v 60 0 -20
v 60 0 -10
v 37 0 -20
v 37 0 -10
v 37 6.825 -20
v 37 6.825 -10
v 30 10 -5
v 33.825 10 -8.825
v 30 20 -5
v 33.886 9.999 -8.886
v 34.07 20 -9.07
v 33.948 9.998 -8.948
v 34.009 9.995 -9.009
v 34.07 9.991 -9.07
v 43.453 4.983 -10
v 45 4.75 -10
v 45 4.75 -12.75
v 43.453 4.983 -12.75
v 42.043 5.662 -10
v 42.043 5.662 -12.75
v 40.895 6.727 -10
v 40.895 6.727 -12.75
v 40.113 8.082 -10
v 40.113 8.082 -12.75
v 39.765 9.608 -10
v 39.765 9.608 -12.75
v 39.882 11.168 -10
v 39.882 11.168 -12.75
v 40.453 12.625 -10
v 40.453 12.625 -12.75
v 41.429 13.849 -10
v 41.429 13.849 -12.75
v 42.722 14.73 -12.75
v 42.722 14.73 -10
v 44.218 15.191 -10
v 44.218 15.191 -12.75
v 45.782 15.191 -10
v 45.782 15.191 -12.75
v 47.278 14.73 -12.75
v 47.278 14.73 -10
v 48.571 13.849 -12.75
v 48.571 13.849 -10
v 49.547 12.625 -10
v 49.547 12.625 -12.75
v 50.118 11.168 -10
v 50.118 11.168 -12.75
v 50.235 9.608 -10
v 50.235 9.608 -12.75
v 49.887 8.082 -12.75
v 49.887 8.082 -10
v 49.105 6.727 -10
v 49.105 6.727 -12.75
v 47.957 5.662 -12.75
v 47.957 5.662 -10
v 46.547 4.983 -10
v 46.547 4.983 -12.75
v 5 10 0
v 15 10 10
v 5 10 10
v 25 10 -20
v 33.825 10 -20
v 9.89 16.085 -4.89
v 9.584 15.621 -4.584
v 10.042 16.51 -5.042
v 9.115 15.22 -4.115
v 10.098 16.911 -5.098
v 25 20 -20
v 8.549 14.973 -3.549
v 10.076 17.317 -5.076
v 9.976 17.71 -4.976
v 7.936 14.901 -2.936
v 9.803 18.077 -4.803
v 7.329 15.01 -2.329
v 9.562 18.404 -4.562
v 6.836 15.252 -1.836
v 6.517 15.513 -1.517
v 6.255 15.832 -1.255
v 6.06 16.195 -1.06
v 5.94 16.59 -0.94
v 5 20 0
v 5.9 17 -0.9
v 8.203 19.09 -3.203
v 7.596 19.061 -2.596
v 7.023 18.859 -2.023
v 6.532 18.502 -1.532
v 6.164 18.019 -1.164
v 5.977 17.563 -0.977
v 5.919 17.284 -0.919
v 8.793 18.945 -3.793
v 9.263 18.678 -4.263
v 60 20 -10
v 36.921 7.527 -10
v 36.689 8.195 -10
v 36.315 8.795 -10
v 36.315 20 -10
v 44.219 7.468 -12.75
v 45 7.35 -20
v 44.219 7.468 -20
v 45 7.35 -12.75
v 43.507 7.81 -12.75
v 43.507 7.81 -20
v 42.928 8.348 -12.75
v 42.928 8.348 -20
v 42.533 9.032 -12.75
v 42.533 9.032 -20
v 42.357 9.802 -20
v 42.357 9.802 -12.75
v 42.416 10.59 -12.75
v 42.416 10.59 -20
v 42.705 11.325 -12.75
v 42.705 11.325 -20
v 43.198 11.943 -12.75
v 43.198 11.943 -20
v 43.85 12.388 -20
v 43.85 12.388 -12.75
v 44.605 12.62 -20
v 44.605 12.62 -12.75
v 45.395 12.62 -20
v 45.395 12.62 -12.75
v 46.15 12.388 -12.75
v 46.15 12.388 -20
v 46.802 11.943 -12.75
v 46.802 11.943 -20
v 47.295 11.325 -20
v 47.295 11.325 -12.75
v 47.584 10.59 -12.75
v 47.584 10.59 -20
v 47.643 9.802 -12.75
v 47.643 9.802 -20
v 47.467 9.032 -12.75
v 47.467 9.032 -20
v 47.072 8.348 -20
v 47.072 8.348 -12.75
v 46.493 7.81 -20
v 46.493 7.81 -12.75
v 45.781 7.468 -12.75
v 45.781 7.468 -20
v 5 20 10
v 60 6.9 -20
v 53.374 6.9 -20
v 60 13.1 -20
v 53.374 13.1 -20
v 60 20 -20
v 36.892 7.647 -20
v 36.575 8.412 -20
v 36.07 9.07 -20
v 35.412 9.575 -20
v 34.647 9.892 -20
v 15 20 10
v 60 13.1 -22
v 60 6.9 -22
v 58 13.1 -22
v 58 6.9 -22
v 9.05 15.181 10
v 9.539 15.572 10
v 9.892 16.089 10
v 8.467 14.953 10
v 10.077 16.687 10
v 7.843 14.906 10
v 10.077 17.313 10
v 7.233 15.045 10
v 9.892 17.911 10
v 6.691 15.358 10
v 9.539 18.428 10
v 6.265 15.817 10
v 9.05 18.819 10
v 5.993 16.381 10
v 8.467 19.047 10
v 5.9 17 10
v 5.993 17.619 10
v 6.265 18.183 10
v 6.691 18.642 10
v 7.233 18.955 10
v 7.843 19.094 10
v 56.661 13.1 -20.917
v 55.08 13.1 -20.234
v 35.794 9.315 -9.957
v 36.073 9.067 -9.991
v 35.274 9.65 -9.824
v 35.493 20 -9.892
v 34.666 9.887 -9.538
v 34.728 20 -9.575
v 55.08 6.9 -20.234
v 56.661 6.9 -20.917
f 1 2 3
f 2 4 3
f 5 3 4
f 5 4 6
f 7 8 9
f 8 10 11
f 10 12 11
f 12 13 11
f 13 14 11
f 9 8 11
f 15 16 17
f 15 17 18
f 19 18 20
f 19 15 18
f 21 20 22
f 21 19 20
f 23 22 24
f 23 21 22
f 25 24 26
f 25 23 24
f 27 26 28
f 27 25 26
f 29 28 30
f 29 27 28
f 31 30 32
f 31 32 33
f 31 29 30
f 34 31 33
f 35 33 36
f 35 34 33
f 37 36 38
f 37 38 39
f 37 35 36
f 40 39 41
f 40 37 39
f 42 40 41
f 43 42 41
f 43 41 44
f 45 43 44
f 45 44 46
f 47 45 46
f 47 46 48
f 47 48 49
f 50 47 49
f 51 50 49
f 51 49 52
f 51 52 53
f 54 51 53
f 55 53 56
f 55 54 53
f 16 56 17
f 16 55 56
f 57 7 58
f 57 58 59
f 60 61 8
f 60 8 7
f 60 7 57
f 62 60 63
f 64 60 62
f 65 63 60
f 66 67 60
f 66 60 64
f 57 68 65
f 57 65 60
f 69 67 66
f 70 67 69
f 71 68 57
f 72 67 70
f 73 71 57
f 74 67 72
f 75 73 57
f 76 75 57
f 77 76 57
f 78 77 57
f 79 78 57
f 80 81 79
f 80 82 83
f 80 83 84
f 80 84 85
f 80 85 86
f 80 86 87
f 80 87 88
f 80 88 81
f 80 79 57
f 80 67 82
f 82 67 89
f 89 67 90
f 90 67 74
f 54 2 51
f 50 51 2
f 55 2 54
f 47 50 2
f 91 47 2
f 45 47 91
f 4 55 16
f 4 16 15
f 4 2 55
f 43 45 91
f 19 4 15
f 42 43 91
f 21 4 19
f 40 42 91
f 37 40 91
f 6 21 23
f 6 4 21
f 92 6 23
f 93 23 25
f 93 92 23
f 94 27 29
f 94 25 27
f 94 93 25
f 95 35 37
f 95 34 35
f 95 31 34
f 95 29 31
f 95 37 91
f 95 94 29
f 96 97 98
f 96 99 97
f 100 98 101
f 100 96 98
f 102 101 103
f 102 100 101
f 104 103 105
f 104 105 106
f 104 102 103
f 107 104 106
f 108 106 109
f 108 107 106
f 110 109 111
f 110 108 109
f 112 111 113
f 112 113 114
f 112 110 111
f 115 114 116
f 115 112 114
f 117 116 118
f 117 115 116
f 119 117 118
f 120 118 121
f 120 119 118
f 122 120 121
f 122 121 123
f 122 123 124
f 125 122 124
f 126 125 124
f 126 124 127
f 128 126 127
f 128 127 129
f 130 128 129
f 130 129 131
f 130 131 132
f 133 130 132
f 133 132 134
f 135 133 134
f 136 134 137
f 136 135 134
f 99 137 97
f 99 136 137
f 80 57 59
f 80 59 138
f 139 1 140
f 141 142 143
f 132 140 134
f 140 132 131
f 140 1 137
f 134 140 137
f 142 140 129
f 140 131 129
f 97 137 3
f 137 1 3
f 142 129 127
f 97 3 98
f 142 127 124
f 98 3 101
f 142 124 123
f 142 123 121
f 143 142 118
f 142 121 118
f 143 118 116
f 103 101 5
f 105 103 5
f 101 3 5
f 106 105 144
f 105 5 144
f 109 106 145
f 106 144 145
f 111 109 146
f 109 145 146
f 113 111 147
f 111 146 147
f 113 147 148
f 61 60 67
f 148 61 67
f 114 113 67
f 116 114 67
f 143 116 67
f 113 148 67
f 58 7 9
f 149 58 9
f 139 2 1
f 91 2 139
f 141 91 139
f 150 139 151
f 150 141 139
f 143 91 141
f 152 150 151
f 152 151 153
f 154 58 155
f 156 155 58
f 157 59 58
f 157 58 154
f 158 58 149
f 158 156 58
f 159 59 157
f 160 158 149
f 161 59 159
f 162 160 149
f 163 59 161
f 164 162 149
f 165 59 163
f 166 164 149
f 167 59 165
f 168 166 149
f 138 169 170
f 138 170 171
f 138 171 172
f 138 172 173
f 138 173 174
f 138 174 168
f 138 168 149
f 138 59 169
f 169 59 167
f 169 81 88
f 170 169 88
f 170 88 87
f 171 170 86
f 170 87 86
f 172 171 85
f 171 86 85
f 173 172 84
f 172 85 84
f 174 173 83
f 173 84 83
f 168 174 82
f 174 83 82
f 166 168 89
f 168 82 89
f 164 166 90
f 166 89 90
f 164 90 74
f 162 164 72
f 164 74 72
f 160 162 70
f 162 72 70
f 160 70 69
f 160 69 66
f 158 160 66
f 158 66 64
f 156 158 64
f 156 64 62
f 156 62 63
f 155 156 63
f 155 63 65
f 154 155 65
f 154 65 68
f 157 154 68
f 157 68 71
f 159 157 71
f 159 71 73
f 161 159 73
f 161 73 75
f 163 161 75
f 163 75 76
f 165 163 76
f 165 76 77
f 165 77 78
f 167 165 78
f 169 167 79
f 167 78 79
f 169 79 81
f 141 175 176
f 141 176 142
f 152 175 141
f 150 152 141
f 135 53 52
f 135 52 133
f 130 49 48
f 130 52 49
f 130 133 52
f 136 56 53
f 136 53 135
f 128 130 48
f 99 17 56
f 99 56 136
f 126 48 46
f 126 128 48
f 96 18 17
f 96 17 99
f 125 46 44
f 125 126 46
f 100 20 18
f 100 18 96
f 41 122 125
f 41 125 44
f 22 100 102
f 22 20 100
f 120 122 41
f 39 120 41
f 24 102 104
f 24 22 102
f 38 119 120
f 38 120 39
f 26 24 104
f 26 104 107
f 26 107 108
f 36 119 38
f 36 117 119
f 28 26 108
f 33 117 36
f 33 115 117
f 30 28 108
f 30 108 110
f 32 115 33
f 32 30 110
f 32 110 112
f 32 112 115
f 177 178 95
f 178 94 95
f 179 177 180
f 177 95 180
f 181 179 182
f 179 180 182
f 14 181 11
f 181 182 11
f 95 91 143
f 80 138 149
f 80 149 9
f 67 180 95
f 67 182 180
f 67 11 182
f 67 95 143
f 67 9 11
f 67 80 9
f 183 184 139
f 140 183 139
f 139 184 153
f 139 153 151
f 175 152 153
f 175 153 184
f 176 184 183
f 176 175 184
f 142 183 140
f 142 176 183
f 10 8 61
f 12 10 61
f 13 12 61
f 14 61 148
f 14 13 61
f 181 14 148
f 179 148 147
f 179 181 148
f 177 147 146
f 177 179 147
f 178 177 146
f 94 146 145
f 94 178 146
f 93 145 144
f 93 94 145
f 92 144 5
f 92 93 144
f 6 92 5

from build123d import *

# Parameters (mm, degrees)
SKETCH1_W                  = 15
SKETCH1_H                  = 20
BOSS_EXTRUDE1_DEPTH        = 10
F_4_2_4_2_DIAMETER_HOLE1_D = 4.2
SKETCH4_W                  = 10
SKETCH4_H                  = 20
BOSS_EXTRUDE2_DEPTH        = 15
SKETCH5_W                  = 15
SKETCH5_H                  = 20
BOSS_EXTRUDE3_DEPTH        = 20
CHAMFER1_SIZE              = 10
CHAMFER2_SIZE              = 15
SKETCH6_W                  = 5
SKETCH6_H                  = 20
CUT_EXTRUDE1_DEPTH         = 10
SKETCH8_W                  = 15
SKETCH8_H                  = 20
BOSS_EXTRUDE4_DEPTH        = 10
CHAMFER3_SIZE              = 10
SKETCH7_W                  = 10
SKETCH7_H                  = 20
BOSS_EXTRUDE5_DEPTH        = 25
FILLET5_R                  = 3.175
SKETCH9_W                  = 10
SKETCH9_H                  = 10
CUT_EXTRUDE4_DEPTH         = 37
SKETCH15_W                 = 35.287710309
SKETCH15_H                 = 35.27052657
CUT_EXTRUDE5_DEPTH         = 10
SKETCH16_W                 = 32
SKETCH16_H                 = 10
CUT_EXTRUDE6_DEPTH         = 46
MOVE_FACE1_BY              = 5
SKETCH19_W                 = 2
SKETCH19_H                 = 6.2
BOSS_EXTRUDE6_DEPTH        = 2
FILLET6_R                  = 6.35
FILLET7_R                  = 3.175


# Some blends are built 0.0001 mm under size
with BuildPart() as part:
    # Sketch1 → Boss-Extrude1 (new body)
    with BuildSketch(Plane.XY):
        with Locations((7.5, 10)):
            Rectangle(SKETCH1_W, SKETCH1_H)
    extrude(amount=BOSS_EXTRUDE1_DEPTH)

    # Ø4.2 (4.2) Diameter Hole1 (through all)
    with Locations(Plane.XY.offset(10)):
        with Locations((8, 17)):
            Hole(F_4_2_4_2_DIAMETER_HOLE1_D / 2)

    # Sketch4 → Boss-Extrude2 (add)
    with BuildSketch(Plane(origin=(15, 0, 0), x_dir=(0, 0, -1), z_dir=(1, 0, 0))):
        with Locations((-5, 10)):
            Rectangle(SKETCH4_W, SKETCH4_H)
    extrude(amount=BOSS_EXTRUDE2_DEPTH)

    # Sketch5 → Boss-Extrude3 (add)
    with BuildSketch(Plane(origin=(0, 0, 0), x_dir=(-1, 0, 0), z_dir=(0, 0, -1))):
        with Locations((-22.5, 10)):
            Rectangle(SKETCH5_W, SKETCH5_H)
    extrude(amount=BOSS_EXTRUDE3_DEPTH)

    # Chamfer1
    # the kernel refuses this chamfer: 10 mm, written as the material it adds along each edge
    with BuildSketch(Plane(origin=(15, 20, 0), x_dir=(-0.9996219169112968, 0, 0.027495876610586372), z_dir=(0, -1, 0))) as chamfer1_piece_1_section:
        Polygon((CHAMFER1_SIZE * 0.999621916911, CHAMFER1_SIZE * 0.0274958766106), (-CHAMFER1_SIZE * 0.0274958766106, CHAMFER1_SIZE * 0.999621916911), (0, 0), align=None)
    chamfer1_piece_1 = extrude(amount=20, mode=Mode.PRIVATE)
    chamfer1_piece_1 = chamfer1_piece_1 - Plane(origin=(8, 17, -3.373966189), x_dir=(-1, 0, 0), z_dir=(0, 0, -1)) * Cylinder(2.1, 80, mode=Mode.PRIVATE)
    add(chamfer1_piece_1)

    # Chamfer2
    chamfer2_edges = [part.edges().sort_by_distance(p)[0] for p in [
        (30, 10, 10),
    ]]
    chamfer(chamfer2_edges, length=CHAMFER2_SIZE)

    # Sketch6 → Cut-Extrude1 (cut)
    with BuildSketch(Plane(origin=(0, 0, 0), x_dir=(-1, 0, 0), z_dir=(0, 0, -1))):
        with Locations((-2.5, 10)):
            Rectangle(SKETCH6_W, SKETCH6_H)
    extrude(amount=-CUT_EXTRUDE1_DEPTH, mode=Mode.SUBTRACT)

    # Sketch8 → Boss-Extrude4 (add)
    with BuildSketch(Plane(origin=(30, 0, 0), x_dir=(0, 0, -1), z_dir=(1, 0, 0))):
        with Locations((12.5, 10)):
            Rectangle(SKETCH8_W, SKETCH8_H)
    extrude(amount=BOSS_EXTRUDE4_DEPTH)

    # Chamfer3
    chamfer3_edges = [part.edges().sort_by_distance(p)[0] for p in [
        (40, 10, -5),
    ]]
    chamfer(chamfer3_edges, length=CHAMFER3_SIZE - 0.0001)  # a hair under: the kernel refuses the full size

    # Sketch7 → Boss-Extrude5 (add)
    with BuildSketch(Plane(origin=(30, 0, 0), x_dir=(0, 0, -1), z_dir=(1, 0, 0))):
        with Locations((15, 10)):
            Rectangle(SKETCH7_W, SKETCH7_H)
    extrude(amount=BOSS_EXTRUDE5_DEPTH)

    # Fillet5
    fillet5_edges = [part.edges().sort_by_distance(p)[0] for p in [
        (35.0001, 10, -10),
    ]]
    fillet(fillet5_edges, radius=FILLET5_R)

    # Sketch9 → Cut-Extrude4 (cut)
    with BuildSketch(Plane(origin=(0, 0, -20), x_dir=(-1, 0, 0), z_dir=(0, 0, -1))):
        with Locations((-10, 5)):
            Rectangle(SKETCH9_W, SKETCH9_H)
    extrude(amount=-CUT_EXTRUDE4_DEPTH, mode=Mode.SUBTRACT)

    # Sketch14 → CBORE for M5 SBHCS2 (revolve, cut)
    with BuildSketch(Plane(origin=(45, 10, 10), x_dir=(0, -1, 0), z_dir=(1, 0, 0))):
        Polygon((0, 0), (0, 30), (2.65, 30), (2.65, 22.75), (5.25, 22.75), (5.25, 0.020977491), (5.275, 0), align=None)
    revolve(axis=Axis((45, 10, 16.35), (0, 0, -1)), mode=Mode.SUBTRACT)

    # Sketch15 → Cut-Extrude5 (cut)
    with BuildSketch(Plane(origin=(2.5, 0, 2.5), x_dir=(-0.707106781186544, 0, 0.7071067811865511), z_dir=(-0.7071067811865511, 0, -0.707106781186544))):
        with Locations((-14.684853065, 9.385409348)):
            Rectangle(SKETCH15_W, SKETCH15_H)
    extrude(amount=CUT_EXTRUDE5_DEPTH, mode=Mode.SUBTRACT)

    # Sketch16 → Cut-Extrude6 (cut)
    with BuildSketch(Plane(origin=(0, 0, -20), x_dir=(-1, 0, 0), z_dir=(0, 0, -1))):
        with Locations((-21, 5)):
            Rectangle(SKETCH16_W, SKETCH16_H)
    extrude(amount=-CUT_EXTRUDE6_DEPTH, mode=Mode.SUBTRACT)

    # Move Face1: a face moved outward by 5.0
    extrude(part.faces().sort_by_distance((55, 10, -15))[0], amount=MOVE_FACE1_BY, dir=(1, 0, 0))

    # Sketch19 → Boss-Extrude6 (add)
    with BuildSketch(Plane(origin=(0, 0, -20), x_dir=(-1, 0, 0), z_dir=(0, 0, -1))):
        with Locations((-59, 10)):
            Rectangle(SKETCH19_W, SKETCH19_H)
    extrude(amount=BOSS_EXTRUDE6_DEPTH)

    # Fillet6
    # the kernel refuses this fillet: 6.35 mm, written as the material it adds along each edge
    with BuildSketch(Plane(origin=(58, 13.1, -20), x_dir=(-1, 0, 0), z_dir=(0, -1, 0))) as fillet6_piece_1:
        with BuildLine():
            CenterArc((4.626013402, 6.35), FILLET6_R, 223.238703461, 46.761296539)
            Line((0, 2), (-0.092520268, 1.913))
            ThreePointArc((-0.092520268, 1.913), (-0.127, 1), (-0.127, 0))
            Line((-0.127, 0), (0, -0.127))
            Line((0, -0.127), (4.626013402, -0.127))
            Line((4.626013402, -0.127), (4.626013402, 0))
        make_face()
    extrude(amount=6.2)

    # Fillet7
    fillet7_edges = [part.edges().sort_by_distance(p)[0] for p in [
        (37, 10, -15),
    ]]
    fillet(fillet7_edges, radius=FILLET7_R)


solid = part.part
